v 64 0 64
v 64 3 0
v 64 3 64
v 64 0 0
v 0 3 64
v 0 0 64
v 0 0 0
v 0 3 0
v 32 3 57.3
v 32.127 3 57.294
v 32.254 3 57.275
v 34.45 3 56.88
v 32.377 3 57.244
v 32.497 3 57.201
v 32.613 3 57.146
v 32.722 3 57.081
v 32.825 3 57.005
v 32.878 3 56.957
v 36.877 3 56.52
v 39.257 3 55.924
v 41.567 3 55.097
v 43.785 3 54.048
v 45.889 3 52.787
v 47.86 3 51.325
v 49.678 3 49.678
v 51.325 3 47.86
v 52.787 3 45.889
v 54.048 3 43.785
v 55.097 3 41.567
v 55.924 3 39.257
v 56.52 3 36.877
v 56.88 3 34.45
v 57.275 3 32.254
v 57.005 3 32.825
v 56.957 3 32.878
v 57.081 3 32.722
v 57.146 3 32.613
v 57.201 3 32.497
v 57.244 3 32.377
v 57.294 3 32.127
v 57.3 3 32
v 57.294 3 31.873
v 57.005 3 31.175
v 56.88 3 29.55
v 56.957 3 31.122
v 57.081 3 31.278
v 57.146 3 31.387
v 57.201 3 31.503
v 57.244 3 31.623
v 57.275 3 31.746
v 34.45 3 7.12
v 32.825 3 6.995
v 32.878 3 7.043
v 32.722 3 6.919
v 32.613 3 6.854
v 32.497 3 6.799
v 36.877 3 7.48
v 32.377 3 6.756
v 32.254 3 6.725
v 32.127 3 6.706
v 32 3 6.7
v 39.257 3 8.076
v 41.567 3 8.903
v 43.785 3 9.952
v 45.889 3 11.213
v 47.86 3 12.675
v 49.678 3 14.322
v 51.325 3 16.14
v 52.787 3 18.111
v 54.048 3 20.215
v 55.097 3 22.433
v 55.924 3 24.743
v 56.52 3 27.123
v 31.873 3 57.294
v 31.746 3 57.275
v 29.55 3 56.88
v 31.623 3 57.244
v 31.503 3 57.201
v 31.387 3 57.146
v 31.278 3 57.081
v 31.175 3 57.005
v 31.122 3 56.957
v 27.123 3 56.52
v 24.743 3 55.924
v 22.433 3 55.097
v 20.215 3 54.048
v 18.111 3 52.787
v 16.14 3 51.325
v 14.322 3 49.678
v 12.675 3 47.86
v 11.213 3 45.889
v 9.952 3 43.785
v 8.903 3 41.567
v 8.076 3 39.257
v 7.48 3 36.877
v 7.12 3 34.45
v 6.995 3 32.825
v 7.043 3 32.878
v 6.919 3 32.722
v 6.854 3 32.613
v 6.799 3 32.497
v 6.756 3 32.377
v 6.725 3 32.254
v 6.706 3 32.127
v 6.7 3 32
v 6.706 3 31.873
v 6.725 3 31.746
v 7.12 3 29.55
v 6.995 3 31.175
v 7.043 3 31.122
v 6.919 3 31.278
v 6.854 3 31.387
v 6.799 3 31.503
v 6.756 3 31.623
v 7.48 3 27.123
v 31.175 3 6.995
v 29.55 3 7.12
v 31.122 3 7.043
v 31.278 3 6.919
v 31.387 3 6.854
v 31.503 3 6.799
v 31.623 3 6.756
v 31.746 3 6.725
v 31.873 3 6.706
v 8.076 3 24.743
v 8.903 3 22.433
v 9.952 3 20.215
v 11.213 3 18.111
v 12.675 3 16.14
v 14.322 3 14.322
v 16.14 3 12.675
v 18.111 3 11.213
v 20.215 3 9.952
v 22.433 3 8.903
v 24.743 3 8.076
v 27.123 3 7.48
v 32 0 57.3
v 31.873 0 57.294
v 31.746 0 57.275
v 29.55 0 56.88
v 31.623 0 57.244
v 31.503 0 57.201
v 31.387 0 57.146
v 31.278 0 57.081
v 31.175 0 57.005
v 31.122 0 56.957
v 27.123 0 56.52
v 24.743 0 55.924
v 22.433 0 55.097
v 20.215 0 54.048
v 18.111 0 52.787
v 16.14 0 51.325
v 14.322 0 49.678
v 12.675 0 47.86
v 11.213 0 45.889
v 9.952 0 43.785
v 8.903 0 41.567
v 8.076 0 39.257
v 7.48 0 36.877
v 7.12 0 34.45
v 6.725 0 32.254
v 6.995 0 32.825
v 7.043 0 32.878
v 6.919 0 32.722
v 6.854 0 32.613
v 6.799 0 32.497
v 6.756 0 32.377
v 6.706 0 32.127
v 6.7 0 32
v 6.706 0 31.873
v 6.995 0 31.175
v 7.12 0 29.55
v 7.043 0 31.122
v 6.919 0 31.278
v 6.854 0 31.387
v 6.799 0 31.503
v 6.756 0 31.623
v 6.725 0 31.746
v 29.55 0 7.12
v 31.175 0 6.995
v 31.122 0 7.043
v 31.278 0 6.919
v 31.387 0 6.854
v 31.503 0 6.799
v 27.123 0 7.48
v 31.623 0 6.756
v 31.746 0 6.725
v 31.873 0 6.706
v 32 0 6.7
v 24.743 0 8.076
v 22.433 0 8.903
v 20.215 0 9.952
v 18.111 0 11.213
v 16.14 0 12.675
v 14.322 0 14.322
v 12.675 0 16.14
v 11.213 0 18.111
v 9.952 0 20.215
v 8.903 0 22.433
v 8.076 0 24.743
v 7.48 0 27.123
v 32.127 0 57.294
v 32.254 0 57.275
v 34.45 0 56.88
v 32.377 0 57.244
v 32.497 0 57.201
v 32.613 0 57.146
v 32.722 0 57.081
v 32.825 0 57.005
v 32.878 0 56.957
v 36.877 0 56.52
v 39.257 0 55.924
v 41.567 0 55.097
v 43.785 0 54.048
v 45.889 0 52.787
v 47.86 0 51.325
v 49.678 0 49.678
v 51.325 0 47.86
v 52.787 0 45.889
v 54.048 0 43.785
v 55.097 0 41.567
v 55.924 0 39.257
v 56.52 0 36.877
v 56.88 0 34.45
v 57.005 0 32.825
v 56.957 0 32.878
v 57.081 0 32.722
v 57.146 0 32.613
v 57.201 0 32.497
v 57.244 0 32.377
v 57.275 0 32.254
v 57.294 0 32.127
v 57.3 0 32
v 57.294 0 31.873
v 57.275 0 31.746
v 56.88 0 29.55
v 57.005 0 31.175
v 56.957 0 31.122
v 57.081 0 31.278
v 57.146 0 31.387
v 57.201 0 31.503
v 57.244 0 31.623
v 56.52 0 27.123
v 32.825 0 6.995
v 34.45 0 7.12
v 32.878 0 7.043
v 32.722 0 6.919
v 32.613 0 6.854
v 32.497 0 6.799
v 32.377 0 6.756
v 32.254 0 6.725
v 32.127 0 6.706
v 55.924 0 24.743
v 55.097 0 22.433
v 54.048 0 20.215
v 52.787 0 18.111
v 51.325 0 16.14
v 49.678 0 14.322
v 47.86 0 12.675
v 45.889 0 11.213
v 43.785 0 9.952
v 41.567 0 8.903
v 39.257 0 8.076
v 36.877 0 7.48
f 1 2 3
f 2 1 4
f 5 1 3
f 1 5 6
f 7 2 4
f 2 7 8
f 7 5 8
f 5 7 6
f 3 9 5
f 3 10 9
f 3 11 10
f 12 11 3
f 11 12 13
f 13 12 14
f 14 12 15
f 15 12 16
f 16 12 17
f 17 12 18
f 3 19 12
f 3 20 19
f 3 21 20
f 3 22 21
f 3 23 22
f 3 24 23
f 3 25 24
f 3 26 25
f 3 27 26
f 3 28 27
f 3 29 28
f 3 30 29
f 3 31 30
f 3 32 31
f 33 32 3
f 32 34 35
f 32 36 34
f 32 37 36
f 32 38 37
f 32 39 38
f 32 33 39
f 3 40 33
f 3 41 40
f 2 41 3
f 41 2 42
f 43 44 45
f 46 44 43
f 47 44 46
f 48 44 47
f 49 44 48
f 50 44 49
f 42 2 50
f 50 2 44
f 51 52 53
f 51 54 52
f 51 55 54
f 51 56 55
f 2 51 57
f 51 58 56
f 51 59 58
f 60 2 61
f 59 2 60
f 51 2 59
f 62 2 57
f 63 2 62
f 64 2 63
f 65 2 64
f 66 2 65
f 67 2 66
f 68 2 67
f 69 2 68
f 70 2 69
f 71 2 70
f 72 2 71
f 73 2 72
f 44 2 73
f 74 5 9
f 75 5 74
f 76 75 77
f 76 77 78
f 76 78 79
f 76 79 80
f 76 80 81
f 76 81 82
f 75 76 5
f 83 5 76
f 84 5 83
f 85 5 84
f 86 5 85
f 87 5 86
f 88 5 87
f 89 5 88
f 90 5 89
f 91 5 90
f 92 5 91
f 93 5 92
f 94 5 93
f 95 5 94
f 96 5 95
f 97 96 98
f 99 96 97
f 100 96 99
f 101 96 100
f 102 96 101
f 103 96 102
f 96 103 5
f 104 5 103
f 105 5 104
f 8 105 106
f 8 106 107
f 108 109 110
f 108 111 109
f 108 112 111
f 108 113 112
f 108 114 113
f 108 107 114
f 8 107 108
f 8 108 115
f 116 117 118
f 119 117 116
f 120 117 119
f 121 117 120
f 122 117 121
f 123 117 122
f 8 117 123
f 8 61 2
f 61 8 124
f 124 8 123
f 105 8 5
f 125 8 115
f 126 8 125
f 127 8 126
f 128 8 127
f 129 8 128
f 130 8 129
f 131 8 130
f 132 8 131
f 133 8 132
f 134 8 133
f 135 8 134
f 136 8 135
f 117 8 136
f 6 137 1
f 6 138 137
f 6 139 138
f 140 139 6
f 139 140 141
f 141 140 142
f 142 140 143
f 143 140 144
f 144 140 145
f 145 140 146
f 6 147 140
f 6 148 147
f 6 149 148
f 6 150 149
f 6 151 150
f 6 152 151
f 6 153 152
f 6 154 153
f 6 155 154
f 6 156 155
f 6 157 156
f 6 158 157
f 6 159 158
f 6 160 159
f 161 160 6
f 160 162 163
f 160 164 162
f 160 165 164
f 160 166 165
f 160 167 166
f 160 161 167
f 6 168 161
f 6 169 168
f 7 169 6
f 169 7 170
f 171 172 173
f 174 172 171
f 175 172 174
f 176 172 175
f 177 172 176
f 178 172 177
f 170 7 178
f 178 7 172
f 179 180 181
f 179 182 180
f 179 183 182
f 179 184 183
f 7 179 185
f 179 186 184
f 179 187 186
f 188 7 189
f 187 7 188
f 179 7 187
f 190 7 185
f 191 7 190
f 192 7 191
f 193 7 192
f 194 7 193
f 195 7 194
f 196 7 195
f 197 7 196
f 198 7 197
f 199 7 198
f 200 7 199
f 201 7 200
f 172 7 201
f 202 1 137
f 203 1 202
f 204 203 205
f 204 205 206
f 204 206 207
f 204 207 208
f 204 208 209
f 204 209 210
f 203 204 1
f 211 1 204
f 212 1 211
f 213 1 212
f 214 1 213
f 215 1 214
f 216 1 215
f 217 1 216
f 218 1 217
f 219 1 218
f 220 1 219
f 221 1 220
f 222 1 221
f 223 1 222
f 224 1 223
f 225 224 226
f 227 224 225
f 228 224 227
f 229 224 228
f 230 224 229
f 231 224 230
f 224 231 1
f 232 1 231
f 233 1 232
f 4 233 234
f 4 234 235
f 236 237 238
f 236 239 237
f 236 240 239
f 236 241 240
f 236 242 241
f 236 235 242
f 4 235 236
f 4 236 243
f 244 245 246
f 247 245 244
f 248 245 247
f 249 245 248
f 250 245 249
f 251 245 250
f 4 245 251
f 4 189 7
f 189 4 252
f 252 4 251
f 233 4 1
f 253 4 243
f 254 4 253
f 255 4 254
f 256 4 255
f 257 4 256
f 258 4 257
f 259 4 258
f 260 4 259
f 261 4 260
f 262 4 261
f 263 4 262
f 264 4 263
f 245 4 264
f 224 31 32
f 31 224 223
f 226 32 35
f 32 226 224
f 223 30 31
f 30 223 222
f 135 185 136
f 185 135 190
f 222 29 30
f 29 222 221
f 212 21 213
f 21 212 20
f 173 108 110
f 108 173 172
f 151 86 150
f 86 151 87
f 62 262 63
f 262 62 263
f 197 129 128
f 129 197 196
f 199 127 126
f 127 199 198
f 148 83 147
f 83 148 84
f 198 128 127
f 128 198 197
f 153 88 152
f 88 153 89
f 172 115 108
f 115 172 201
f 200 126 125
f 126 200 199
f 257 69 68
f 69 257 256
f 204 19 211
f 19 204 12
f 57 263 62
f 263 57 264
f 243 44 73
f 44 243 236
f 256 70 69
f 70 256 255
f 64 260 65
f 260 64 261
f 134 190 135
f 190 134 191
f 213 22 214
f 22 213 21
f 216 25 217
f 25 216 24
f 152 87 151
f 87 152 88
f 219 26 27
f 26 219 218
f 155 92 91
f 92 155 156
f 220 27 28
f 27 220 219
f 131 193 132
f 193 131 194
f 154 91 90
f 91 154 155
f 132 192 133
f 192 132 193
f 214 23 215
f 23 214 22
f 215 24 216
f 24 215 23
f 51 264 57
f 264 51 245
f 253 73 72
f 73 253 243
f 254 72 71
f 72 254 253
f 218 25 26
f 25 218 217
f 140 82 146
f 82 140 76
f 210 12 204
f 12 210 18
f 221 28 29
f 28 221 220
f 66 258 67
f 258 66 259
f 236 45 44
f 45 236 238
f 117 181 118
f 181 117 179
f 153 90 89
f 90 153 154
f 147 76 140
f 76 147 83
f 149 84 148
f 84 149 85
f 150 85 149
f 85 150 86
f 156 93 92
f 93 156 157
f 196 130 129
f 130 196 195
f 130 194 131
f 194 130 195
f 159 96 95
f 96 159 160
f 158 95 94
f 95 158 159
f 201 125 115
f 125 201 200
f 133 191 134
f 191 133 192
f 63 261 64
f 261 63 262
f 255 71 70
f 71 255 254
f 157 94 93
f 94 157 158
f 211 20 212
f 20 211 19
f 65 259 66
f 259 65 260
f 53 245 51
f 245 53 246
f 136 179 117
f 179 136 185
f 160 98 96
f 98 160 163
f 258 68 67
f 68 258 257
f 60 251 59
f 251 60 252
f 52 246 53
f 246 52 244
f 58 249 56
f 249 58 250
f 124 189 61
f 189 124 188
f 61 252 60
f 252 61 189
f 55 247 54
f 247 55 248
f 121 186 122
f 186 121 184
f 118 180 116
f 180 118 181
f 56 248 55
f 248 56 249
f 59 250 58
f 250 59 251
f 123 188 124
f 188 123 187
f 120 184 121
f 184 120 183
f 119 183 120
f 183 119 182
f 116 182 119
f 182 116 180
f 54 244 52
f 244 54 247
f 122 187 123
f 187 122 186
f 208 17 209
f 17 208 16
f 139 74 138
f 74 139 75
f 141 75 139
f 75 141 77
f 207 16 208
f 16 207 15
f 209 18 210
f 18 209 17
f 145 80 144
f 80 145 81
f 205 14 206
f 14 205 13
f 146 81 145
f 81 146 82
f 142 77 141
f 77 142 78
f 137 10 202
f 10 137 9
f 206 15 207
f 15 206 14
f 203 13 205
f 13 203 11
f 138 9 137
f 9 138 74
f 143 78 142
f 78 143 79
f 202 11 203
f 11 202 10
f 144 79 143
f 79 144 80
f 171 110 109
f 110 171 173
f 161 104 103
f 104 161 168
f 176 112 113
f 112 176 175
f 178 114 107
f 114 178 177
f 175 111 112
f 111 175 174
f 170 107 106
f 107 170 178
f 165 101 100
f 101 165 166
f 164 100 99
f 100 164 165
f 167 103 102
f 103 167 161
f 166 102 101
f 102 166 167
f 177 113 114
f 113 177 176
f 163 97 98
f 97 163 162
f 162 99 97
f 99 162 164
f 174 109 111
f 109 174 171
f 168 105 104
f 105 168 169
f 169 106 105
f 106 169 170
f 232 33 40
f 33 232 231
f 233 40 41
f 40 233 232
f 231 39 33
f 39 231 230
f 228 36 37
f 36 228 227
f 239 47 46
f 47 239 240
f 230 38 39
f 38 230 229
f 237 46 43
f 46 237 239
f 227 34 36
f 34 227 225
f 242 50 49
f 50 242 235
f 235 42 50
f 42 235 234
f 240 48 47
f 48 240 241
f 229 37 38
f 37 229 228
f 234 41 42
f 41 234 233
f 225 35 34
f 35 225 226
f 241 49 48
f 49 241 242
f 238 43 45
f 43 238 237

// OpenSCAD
// Status Beacon v0.1 LED Carrier
// Holds a 16 LED WS2812B ring behind the diffuser.
// Adjust ring screw holes if your ring is different.

$fn = 64;

difference() {
    cube([64,3,64]);

    // Main light opening
    translate([32,1.5,32]) rotate([90,0,0]) cylinder(h=5,d=50,center=true);

    // LED ring screw holes
    translate([32,1.5,8]) rotate([90,0,0]) cylinder(h=5,d=2.6,center=true);
    translate([32,1.5,56]) rotate([90,0,0]) cylinder(h=5,d=2.6,center=true);
    translate([8,1.5,32]) rotate([90,0,0]) cylinder(h=5,d=2.6,center=true);
    translate([56,1.5,32]) rotate([90,0,0]) cylinder(h=5,d=2.6,center=true);
}
